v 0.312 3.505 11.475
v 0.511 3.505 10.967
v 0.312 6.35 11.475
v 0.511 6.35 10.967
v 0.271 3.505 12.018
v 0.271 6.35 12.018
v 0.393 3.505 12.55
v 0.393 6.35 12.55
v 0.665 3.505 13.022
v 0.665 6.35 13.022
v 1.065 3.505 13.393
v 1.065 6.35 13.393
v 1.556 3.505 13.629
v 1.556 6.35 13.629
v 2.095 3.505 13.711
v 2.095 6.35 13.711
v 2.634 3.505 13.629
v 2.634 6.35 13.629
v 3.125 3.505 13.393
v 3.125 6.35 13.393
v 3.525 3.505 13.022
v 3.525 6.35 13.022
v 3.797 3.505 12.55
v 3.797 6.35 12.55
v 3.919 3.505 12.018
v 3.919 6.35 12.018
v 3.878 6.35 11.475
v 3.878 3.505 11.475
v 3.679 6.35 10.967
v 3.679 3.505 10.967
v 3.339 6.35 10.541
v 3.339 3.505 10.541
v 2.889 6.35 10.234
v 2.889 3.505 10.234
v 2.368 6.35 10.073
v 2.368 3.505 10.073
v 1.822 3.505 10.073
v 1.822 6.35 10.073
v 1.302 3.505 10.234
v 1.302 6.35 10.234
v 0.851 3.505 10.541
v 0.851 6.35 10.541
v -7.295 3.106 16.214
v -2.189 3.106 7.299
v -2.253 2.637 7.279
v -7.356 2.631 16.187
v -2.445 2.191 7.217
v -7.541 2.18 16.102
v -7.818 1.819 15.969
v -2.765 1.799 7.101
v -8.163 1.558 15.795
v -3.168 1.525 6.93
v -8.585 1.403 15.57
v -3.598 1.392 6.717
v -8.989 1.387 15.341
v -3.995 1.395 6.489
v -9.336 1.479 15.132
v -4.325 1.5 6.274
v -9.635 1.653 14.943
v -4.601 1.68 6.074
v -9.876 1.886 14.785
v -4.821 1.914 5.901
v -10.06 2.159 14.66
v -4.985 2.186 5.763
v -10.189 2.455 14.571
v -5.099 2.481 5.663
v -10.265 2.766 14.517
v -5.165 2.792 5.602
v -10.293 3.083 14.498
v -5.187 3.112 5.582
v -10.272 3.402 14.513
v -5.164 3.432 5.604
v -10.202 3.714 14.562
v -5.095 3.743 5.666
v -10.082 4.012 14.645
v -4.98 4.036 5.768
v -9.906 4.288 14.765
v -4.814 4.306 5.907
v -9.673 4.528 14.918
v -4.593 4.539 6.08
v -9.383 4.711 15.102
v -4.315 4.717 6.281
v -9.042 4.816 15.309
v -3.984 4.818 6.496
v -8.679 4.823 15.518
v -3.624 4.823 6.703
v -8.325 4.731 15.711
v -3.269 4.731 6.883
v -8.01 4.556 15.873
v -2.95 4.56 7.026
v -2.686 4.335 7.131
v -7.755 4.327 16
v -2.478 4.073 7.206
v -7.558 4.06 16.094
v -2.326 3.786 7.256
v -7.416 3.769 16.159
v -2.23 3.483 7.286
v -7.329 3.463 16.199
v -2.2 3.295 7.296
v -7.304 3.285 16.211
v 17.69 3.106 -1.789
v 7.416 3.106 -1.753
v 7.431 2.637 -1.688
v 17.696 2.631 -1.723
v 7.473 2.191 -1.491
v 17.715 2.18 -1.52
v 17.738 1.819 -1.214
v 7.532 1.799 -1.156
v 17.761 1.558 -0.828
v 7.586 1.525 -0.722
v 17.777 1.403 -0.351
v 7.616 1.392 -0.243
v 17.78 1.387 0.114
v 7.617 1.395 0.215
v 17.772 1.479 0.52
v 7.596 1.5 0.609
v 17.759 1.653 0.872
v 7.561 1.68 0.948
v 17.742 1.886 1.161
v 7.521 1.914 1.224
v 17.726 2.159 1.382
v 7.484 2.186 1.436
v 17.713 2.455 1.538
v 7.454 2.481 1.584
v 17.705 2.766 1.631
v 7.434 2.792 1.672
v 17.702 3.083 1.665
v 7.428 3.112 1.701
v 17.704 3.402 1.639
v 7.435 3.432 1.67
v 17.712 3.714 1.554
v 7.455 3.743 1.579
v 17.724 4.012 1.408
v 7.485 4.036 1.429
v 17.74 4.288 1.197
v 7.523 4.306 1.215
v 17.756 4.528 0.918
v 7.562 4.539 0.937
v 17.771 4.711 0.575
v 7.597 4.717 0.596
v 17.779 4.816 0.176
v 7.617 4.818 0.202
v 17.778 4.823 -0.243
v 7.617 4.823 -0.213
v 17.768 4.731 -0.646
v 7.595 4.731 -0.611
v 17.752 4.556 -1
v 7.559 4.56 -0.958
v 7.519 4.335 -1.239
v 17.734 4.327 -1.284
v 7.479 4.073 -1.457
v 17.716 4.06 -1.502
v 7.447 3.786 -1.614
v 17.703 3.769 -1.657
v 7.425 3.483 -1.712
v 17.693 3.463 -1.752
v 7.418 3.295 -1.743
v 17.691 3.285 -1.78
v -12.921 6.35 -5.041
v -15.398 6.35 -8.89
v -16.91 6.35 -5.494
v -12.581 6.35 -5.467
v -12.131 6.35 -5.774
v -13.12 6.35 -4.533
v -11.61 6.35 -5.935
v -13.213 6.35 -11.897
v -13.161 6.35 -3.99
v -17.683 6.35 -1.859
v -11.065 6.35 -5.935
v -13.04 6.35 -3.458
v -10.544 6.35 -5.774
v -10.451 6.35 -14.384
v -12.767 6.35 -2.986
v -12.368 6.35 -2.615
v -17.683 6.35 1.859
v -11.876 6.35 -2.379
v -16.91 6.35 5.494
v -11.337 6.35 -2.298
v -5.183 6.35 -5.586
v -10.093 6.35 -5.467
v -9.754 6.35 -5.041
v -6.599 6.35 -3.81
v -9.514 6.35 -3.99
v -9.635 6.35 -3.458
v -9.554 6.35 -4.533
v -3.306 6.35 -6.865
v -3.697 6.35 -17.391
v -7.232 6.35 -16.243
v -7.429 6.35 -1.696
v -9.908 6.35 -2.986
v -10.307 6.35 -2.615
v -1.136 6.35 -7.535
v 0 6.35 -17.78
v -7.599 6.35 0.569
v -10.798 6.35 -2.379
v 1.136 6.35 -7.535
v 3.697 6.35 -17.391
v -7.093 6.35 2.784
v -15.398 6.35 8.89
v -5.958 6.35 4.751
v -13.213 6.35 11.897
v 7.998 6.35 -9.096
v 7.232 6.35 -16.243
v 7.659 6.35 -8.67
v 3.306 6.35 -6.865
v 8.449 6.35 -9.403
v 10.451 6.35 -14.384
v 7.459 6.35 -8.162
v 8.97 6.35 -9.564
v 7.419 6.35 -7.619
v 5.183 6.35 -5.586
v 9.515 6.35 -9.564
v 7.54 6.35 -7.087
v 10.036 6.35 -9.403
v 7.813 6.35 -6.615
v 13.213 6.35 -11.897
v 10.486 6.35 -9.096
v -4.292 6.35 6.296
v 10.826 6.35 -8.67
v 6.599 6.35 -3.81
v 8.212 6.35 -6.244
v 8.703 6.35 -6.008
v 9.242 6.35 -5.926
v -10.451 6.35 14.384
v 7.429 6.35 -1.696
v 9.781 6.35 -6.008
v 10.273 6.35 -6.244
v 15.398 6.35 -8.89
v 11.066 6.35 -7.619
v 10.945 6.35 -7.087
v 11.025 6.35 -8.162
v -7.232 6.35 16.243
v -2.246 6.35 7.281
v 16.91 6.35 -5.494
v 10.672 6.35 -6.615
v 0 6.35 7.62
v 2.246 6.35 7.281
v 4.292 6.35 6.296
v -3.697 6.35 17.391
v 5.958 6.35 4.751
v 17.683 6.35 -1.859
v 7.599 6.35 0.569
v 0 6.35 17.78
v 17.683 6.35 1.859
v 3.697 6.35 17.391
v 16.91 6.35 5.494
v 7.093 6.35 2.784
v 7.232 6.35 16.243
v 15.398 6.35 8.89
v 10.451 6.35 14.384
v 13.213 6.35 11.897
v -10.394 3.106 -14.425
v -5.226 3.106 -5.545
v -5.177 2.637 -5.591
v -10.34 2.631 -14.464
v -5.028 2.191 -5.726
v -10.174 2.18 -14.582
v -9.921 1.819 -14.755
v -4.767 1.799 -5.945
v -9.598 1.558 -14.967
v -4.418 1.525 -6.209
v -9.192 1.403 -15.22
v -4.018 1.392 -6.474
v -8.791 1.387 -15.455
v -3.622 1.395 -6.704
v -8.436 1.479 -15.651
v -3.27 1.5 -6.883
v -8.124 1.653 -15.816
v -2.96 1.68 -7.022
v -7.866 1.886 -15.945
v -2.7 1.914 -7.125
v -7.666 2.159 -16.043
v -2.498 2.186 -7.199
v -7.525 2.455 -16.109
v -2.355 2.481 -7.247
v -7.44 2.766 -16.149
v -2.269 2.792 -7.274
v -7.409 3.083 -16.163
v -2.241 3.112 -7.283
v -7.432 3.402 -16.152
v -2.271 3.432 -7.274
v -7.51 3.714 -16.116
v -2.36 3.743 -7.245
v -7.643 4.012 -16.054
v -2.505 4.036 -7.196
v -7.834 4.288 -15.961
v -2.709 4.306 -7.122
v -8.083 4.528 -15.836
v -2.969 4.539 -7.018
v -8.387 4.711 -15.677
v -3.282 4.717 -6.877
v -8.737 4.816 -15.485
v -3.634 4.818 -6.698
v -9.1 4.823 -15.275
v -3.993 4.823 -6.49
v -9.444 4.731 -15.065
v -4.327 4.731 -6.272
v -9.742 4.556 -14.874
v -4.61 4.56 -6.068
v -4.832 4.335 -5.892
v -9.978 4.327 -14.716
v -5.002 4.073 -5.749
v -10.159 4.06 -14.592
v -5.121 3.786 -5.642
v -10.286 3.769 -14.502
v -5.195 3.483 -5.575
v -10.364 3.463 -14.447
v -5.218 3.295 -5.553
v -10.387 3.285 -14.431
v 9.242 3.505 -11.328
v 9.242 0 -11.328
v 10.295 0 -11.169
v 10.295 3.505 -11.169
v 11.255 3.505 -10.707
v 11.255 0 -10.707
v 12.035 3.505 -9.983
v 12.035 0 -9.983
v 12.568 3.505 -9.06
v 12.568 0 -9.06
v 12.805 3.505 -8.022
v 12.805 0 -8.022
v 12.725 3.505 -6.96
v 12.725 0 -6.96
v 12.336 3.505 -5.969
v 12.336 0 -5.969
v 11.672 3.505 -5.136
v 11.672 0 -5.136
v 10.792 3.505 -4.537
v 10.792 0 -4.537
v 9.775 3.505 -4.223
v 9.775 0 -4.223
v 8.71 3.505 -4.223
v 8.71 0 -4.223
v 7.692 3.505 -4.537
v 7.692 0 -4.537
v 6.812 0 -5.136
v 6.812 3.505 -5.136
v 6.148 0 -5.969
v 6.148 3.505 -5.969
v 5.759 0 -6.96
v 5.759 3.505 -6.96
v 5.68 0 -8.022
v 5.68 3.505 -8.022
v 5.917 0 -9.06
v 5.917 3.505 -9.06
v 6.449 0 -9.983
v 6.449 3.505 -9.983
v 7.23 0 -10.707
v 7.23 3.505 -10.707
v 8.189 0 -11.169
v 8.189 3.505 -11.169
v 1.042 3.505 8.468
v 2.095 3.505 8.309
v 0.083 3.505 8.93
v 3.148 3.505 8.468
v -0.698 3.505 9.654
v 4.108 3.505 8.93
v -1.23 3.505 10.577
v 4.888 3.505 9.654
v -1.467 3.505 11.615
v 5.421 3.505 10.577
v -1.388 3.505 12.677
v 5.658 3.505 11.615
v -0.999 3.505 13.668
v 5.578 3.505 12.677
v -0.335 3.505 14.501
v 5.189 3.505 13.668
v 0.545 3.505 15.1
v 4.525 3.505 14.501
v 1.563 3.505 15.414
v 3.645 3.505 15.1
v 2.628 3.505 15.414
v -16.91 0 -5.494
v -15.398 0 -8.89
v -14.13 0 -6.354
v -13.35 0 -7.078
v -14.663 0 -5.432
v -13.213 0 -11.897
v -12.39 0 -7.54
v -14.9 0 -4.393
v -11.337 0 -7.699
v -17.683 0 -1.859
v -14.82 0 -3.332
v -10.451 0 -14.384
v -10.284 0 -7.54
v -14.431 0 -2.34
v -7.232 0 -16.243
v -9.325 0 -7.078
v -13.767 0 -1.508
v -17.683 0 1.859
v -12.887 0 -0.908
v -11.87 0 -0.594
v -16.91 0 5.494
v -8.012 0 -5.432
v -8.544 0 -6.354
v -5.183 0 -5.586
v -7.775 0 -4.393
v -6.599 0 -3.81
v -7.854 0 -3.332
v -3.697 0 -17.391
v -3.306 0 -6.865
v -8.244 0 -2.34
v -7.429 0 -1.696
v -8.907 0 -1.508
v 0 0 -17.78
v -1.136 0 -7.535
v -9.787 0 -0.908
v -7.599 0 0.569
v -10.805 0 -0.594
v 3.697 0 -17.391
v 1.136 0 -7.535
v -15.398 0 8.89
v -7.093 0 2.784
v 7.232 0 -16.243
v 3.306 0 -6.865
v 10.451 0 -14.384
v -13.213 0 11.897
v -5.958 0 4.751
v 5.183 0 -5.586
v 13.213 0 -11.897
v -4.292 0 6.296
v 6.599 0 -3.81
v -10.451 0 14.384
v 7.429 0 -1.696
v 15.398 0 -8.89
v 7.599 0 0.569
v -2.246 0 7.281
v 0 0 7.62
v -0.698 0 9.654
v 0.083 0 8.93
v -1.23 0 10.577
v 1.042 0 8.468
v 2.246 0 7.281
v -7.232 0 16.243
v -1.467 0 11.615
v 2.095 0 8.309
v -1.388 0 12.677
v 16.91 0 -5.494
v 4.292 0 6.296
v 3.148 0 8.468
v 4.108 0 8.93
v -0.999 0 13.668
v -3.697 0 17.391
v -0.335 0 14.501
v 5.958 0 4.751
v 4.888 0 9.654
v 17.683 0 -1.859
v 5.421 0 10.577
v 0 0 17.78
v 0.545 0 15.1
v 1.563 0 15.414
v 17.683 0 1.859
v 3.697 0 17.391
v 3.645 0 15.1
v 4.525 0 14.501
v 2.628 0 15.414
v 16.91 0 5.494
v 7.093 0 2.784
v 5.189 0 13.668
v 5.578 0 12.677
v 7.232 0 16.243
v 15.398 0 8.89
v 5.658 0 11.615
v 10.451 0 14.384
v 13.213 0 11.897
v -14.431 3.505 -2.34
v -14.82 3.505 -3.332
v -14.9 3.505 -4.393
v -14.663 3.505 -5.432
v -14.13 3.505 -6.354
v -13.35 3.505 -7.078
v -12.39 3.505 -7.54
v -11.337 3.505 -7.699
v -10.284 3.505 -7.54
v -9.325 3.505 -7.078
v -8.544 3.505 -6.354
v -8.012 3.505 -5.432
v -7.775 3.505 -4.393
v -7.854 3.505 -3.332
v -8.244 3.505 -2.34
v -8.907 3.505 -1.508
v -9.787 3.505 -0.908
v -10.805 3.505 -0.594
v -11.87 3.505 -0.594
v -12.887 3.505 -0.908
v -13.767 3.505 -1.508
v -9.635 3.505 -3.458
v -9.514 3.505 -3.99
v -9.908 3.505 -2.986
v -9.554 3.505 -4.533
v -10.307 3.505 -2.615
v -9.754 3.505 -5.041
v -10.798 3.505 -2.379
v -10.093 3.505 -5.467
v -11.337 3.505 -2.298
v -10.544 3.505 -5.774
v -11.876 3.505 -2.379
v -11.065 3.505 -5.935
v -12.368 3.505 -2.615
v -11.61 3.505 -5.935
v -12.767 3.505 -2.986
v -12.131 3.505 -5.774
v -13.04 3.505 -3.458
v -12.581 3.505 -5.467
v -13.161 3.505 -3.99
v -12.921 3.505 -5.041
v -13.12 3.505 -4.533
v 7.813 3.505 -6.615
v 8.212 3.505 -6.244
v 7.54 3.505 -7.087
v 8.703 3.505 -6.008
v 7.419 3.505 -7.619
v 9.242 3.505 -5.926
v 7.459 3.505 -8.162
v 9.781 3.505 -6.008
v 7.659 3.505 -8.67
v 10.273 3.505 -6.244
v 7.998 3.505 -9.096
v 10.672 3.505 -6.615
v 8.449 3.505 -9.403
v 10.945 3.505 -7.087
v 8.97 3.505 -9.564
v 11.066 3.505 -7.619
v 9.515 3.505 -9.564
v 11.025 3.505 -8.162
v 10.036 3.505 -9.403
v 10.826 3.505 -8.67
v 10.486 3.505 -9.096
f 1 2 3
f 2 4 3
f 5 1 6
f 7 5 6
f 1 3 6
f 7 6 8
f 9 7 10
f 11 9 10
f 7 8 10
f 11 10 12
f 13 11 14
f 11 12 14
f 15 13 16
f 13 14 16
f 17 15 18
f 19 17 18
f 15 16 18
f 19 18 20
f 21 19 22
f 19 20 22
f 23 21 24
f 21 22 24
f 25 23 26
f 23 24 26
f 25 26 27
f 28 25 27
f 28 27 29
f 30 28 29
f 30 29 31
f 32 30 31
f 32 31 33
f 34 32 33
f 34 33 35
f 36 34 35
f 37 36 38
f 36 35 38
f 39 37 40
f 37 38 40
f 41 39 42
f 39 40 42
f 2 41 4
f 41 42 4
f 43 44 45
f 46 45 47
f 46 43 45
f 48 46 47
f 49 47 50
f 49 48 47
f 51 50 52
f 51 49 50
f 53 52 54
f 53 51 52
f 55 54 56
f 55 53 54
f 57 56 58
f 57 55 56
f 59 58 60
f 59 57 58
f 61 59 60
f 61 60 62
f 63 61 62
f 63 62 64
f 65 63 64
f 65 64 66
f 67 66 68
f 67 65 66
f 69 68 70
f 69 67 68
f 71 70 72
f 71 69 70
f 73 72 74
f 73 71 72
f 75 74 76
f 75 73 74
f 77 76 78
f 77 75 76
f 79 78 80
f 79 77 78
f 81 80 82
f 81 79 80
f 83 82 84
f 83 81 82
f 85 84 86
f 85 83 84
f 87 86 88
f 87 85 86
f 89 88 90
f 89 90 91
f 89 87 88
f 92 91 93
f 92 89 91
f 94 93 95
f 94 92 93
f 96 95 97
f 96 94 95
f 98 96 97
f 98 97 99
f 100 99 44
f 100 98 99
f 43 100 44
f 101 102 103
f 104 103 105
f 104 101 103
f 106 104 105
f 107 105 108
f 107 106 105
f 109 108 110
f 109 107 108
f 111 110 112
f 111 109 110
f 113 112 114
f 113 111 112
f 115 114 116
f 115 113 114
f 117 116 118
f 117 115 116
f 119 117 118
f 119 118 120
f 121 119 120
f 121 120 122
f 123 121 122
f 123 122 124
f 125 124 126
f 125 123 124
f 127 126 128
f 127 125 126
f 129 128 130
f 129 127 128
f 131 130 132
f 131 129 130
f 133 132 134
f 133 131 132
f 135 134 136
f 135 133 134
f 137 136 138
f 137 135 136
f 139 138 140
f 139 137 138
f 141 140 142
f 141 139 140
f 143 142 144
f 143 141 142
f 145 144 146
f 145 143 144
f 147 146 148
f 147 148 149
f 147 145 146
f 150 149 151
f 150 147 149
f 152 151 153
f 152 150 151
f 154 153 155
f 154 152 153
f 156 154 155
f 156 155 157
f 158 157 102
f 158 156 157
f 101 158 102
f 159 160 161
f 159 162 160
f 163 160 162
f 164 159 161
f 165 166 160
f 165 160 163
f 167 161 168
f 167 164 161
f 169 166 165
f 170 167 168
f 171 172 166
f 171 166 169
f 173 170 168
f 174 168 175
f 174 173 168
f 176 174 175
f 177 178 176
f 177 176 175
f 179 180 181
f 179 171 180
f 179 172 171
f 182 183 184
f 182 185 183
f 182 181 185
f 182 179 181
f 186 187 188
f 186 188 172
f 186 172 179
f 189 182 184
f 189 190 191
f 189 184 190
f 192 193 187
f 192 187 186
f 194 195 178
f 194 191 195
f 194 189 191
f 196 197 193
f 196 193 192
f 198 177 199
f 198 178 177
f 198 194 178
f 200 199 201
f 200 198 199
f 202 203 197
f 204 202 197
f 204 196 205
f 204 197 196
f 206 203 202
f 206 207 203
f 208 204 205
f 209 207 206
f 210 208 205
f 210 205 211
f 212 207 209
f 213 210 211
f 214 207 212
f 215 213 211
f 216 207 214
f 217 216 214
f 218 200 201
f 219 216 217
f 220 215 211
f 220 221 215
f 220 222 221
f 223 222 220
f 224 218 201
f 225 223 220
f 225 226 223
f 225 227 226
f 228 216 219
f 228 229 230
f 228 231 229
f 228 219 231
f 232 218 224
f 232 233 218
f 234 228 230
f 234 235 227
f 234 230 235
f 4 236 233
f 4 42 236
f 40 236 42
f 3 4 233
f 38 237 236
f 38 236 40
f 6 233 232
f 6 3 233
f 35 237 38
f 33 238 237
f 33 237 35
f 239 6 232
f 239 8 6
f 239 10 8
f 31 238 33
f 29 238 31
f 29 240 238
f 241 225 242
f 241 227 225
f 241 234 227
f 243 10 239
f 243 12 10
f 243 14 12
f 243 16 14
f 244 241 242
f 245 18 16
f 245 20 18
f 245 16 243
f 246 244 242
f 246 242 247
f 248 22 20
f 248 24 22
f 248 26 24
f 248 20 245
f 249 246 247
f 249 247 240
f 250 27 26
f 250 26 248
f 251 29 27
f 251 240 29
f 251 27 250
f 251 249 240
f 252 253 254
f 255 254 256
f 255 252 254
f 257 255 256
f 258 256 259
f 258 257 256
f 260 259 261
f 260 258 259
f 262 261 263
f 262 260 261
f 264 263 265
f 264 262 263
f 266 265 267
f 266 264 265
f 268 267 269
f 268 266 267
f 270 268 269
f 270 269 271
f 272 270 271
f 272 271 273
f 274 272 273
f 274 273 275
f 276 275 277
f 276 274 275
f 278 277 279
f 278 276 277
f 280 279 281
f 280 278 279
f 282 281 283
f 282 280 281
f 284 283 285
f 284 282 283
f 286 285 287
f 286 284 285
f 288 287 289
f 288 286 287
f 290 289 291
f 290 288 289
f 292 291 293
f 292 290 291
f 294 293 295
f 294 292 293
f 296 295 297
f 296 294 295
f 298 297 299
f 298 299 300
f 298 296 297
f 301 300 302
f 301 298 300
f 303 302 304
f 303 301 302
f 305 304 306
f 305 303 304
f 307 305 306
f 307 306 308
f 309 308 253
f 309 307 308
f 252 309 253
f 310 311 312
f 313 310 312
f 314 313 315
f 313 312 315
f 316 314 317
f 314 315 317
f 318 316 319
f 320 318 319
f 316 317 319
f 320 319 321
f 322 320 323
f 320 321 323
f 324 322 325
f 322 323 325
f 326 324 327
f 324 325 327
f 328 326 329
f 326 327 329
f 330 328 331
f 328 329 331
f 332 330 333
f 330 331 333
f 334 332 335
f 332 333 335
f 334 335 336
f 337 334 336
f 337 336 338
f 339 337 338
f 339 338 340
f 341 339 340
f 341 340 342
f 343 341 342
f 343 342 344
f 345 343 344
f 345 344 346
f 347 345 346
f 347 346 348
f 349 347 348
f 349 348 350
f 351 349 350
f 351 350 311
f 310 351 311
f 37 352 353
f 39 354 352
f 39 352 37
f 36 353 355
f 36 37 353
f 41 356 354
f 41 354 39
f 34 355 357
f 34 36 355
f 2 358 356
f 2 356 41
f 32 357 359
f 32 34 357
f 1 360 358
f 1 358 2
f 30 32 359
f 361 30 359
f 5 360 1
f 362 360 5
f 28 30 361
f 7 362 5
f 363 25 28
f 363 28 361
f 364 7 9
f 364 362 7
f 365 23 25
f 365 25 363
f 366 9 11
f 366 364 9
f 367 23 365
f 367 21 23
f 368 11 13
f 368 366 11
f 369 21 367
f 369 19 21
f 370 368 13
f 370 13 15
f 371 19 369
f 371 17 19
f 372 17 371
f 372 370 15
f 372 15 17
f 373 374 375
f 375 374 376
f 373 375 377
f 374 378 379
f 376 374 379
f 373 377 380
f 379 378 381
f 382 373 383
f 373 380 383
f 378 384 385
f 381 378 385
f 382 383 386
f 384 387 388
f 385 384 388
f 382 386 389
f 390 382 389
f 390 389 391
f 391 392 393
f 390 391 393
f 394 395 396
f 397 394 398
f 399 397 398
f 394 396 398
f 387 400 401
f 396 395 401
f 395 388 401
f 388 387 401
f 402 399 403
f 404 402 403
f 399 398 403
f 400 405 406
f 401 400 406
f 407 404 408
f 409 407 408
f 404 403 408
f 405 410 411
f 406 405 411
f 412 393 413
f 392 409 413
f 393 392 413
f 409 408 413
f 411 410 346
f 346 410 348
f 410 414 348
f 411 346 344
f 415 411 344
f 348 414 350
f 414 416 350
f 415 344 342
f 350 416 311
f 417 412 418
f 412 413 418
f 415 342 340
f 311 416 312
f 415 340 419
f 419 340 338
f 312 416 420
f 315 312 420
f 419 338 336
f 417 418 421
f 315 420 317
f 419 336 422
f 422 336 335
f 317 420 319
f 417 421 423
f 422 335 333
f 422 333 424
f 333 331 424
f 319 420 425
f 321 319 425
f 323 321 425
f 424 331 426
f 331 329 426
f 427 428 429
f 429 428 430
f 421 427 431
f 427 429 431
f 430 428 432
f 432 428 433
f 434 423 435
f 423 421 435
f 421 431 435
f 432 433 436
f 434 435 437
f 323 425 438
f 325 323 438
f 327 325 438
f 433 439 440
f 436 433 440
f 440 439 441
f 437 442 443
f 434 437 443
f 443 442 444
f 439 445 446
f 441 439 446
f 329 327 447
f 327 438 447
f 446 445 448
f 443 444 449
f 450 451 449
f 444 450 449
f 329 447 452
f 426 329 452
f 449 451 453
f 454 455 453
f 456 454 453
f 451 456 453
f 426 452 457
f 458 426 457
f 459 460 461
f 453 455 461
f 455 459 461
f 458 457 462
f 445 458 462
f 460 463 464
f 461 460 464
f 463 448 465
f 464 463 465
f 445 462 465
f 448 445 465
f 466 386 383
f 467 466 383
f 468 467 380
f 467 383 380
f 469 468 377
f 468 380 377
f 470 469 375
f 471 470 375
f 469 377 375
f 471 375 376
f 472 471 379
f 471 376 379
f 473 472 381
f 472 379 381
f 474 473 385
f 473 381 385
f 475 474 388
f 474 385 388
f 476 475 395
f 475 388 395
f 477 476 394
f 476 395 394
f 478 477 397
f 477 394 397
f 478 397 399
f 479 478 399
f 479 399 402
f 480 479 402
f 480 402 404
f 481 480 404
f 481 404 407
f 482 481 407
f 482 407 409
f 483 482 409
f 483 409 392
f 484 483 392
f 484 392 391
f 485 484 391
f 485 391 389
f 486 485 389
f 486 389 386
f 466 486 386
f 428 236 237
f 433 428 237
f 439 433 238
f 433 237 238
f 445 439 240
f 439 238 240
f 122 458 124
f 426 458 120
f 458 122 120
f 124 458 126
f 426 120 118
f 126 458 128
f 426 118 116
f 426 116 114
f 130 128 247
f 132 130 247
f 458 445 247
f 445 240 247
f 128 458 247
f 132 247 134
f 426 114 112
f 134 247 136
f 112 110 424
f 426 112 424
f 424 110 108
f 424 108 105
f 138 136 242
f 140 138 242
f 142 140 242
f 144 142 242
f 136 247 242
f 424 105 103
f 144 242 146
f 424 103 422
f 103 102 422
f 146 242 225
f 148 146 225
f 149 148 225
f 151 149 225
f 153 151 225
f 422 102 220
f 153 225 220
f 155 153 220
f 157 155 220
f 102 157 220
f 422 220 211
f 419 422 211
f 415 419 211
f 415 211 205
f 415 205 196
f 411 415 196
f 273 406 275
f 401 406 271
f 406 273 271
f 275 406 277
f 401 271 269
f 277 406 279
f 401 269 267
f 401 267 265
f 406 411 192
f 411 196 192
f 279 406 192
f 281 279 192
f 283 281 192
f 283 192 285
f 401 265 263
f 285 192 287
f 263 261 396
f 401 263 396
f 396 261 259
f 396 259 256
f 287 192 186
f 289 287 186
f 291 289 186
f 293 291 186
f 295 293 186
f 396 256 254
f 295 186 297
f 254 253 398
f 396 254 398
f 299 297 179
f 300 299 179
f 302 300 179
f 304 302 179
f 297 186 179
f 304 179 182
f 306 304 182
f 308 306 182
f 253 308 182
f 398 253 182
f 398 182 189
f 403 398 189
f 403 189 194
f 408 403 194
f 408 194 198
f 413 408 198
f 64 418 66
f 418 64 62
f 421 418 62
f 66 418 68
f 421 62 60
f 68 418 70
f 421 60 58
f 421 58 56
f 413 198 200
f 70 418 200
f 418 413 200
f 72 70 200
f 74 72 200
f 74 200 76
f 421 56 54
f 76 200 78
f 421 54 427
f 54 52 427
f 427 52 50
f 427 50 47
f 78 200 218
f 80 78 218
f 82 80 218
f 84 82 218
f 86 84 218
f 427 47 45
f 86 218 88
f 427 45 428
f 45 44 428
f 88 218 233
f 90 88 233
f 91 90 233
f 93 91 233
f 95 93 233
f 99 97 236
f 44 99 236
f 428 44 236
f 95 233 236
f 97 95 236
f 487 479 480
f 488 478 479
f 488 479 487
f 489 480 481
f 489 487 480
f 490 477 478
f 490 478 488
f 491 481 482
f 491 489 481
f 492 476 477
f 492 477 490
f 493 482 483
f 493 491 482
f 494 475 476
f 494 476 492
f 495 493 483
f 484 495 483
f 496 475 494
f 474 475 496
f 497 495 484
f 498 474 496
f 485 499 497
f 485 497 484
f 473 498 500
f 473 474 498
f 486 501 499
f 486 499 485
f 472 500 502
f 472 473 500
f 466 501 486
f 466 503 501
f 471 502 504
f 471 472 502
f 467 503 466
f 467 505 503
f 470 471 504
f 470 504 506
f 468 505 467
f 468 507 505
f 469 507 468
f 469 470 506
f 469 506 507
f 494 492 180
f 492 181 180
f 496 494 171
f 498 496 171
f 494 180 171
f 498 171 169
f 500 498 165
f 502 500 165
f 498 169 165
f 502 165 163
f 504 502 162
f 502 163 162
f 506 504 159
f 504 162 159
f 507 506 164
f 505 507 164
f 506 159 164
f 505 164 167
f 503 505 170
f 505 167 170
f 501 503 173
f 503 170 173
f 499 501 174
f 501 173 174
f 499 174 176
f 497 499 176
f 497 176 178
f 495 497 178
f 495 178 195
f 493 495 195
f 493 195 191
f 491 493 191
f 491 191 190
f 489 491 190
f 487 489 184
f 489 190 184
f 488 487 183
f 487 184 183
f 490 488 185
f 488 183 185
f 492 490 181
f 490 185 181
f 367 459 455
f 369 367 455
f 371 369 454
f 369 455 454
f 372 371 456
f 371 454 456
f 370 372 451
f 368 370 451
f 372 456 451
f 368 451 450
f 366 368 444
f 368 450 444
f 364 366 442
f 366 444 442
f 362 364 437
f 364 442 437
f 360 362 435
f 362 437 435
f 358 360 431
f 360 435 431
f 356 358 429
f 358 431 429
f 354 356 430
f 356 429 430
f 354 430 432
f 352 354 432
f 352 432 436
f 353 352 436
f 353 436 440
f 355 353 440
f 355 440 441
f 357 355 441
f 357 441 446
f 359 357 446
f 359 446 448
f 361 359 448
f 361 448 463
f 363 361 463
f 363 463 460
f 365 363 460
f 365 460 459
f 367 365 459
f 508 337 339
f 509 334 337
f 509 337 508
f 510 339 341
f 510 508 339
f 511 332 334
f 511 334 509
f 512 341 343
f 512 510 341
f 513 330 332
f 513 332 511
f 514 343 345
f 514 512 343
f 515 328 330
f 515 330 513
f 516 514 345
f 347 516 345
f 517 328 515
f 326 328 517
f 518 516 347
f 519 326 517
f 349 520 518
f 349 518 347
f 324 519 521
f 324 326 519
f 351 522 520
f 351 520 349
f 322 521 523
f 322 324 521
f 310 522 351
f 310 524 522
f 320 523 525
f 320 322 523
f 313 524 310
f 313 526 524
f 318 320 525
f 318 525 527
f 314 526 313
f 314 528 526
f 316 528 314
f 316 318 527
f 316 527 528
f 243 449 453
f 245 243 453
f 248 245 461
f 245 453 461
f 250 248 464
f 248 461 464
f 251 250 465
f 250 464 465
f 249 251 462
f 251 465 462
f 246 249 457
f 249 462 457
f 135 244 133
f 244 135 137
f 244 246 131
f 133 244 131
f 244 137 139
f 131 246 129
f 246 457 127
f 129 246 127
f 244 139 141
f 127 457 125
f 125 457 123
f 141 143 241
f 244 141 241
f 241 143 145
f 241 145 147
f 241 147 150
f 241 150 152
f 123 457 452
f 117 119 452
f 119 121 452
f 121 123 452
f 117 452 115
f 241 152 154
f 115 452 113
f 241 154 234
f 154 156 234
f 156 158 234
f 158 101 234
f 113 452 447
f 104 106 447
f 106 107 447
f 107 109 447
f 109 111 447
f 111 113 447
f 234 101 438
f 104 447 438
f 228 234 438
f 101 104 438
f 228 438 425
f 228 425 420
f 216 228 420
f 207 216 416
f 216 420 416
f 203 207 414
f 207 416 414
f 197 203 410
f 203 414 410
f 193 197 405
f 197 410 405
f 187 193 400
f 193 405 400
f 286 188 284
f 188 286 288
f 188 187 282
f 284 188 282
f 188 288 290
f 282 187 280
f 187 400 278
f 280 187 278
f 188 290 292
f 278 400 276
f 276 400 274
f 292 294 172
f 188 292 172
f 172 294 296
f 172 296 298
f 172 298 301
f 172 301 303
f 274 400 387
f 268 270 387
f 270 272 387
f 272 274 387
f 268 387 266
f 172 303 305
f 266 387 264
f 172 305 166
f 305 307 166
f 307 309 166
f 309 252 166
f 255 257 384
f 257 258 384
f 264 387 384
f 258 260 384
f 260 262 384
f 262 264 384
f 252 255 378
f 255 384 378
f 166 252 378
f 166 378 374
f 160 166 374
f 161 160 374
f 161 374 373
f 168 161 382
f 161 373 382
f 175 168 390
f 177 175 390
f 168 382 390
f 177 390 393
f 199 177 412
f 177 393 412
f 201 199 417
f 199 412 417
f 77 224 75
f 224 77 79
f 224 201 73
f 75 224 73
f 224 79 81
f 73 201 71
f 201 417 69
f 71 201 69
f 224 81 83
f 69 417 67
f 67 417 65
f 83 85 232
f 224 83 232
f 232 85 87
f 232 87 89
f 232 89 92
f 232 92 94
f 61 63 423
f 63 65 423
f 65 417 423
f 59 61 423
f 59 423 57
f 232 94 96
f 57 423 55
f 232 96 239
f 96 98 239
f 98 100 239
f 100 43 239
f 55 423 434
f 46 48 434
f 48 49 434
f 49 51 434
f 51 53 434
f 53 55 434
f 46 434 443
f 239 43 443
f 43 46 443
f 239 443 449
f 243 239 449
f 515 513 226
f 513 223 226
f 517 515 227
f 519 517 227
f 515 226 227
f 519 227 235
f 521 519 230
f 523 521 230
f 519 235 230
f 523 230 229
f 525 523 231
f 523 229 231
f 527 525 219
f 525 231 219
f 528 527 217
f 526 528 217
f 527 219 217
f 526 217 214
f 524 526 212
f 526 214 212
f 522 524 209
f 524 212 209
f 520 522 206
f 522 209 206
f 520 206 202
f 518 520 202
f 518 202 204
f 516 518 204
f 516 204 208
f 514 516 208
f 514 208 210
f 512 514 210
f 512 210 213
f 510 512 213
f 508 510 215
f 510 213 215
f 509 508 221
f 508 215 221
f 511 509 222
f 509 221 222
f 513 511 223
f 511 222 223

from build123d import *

# Parameters (mm, degrees)
SKETCH1_R                                      = 17.78
BOSS_EXTRUDE1_DEPTH                            = 6.35
CIRPATTERN3_COUNT                              = 3
CUT_EXTRUDE2_REACH                             = 27.934
SKETCH16_R                                     = 7.62
CBORE_FOR_6_SOCKET_HEAD_CAP_SCREW4_D           = 3.6576
CBORE_FOR_6_SOCKET_HEAD_CAP_SCREW4_CBORE_D     = 7.14502
CBORE_FOR_6_SOCKET_HEAD_CAP_SCREW4_CBORE_DEPTH = 3.5052
CIRPATTERN4_COUNT                              = 3


with BuildPart() as part:
    # Sketch1 → Boss-Extrude1 (new body)
    with BuildSketch(Plane(origin=(0, 0, 0), x_dir=(1, 0, 0), z_dir=(0, 1, 0))):
        with Locations(Location((0, 0, 0), (0, 0, 270))):
            Circle(SKETCH1_R)
    extrude(amount=BOSS_EXTRUDE1_DEPTH)

    # Sketch15 → Tap Drill for #8-32 Tap2 (revolve, cut)
    with BuildSketch(Plane(origin=(-8.835910942, 3.105629072, 15.4290336), x_dir=(0.8677746681735182, 0, 0.4969578707258196), z_dir=(0, 1, 0))):
        Polygon((0, 0), (0, 14.149292883), (1.7272, 12.7), (1.7272, 0), align=None)
    tap_drill_for_8_32_tap2 = revolve(axis=Axis((-11.991593421, 3.105629072, 20.939402743), (0.4969578707258196, 0, -0.8677746681735182)), mode=Mode.SUBTRACT)

    # CirPattern3: Tap Drill for #8-32 Tap2 ×3 about axis
    cirpattern3_axis = Axis((0, 6.35, 0), (0, -1, 0))
    for i in range(1, CIRPATTERN3_COUNT):
        add(tap_drill_for_8_32_tap2.rotate(cirpattern3_axis, i * 360 / CIRPATTERN3_COUNT), mode=Mode.SUBTRACT)

    # Sketch16 → Cut-Extrude2 (cut, up to next)
    with BuildSketch(Plane(origin=(0, 6.35, 0), x_dir=(1, 0, 0), z_dir=(0, 1, 0)), mode=Mode.PRIVATE) as cut_extrude2_sk1:
        with Locations(Location((0, 0, 0), (0, 0, 270))):
            Circle(SKETCH16_R)
    cut_extrude2_tool1 = extrude(cut_extrude2_sk1.sketch, amount=-CUT_EXTRUDE2_REACH, mode=Mode.PRIVATE) & part.part
    add(cut_extrude2_tool1.solids().sort_by_distance((0, 6.35, 0))[0], mode=Mode.SUBTRACT)

    # CBORE for #6 Socket Head Cap Screw4 (through all)
    with Locations(Plane(origin=(9.242326206, 0, -7.755232511), x_dir=(0, 0, -1), z_dir=(0, -1, 0))):
        with Locations((0, 0)):
            cbore_for_6_socket_head_cap_screw4 = CounterBoreHole(CBORE_FOR_6_SOCKET_HEAD_CAP_SCREW4_D / 2, CBORE_FOR_6_SOCKET_HEAD_CAP_SCREW4_CBORE_D / 2, CBORE_FOR_6_SOCKET_HEAD_CAP_SCREW4_CBORE_DEPTH)

    # CirPattern4: CBORE for #6 Socket Head Cap Screw4 ×3 about axis
    cirpattern4_axis = Axis((0, 0, 0), (0, 1, 0))
    for i in range(1, CIRPATTERN4_COUNT):
        add(cbore_for_6_socket_head_cap_screw4.rotate(cirpattern4_axis, i * 360 / CIRPATTERN4_COUNT), mode=Mode.SUBTRACT)


solid = part.part
